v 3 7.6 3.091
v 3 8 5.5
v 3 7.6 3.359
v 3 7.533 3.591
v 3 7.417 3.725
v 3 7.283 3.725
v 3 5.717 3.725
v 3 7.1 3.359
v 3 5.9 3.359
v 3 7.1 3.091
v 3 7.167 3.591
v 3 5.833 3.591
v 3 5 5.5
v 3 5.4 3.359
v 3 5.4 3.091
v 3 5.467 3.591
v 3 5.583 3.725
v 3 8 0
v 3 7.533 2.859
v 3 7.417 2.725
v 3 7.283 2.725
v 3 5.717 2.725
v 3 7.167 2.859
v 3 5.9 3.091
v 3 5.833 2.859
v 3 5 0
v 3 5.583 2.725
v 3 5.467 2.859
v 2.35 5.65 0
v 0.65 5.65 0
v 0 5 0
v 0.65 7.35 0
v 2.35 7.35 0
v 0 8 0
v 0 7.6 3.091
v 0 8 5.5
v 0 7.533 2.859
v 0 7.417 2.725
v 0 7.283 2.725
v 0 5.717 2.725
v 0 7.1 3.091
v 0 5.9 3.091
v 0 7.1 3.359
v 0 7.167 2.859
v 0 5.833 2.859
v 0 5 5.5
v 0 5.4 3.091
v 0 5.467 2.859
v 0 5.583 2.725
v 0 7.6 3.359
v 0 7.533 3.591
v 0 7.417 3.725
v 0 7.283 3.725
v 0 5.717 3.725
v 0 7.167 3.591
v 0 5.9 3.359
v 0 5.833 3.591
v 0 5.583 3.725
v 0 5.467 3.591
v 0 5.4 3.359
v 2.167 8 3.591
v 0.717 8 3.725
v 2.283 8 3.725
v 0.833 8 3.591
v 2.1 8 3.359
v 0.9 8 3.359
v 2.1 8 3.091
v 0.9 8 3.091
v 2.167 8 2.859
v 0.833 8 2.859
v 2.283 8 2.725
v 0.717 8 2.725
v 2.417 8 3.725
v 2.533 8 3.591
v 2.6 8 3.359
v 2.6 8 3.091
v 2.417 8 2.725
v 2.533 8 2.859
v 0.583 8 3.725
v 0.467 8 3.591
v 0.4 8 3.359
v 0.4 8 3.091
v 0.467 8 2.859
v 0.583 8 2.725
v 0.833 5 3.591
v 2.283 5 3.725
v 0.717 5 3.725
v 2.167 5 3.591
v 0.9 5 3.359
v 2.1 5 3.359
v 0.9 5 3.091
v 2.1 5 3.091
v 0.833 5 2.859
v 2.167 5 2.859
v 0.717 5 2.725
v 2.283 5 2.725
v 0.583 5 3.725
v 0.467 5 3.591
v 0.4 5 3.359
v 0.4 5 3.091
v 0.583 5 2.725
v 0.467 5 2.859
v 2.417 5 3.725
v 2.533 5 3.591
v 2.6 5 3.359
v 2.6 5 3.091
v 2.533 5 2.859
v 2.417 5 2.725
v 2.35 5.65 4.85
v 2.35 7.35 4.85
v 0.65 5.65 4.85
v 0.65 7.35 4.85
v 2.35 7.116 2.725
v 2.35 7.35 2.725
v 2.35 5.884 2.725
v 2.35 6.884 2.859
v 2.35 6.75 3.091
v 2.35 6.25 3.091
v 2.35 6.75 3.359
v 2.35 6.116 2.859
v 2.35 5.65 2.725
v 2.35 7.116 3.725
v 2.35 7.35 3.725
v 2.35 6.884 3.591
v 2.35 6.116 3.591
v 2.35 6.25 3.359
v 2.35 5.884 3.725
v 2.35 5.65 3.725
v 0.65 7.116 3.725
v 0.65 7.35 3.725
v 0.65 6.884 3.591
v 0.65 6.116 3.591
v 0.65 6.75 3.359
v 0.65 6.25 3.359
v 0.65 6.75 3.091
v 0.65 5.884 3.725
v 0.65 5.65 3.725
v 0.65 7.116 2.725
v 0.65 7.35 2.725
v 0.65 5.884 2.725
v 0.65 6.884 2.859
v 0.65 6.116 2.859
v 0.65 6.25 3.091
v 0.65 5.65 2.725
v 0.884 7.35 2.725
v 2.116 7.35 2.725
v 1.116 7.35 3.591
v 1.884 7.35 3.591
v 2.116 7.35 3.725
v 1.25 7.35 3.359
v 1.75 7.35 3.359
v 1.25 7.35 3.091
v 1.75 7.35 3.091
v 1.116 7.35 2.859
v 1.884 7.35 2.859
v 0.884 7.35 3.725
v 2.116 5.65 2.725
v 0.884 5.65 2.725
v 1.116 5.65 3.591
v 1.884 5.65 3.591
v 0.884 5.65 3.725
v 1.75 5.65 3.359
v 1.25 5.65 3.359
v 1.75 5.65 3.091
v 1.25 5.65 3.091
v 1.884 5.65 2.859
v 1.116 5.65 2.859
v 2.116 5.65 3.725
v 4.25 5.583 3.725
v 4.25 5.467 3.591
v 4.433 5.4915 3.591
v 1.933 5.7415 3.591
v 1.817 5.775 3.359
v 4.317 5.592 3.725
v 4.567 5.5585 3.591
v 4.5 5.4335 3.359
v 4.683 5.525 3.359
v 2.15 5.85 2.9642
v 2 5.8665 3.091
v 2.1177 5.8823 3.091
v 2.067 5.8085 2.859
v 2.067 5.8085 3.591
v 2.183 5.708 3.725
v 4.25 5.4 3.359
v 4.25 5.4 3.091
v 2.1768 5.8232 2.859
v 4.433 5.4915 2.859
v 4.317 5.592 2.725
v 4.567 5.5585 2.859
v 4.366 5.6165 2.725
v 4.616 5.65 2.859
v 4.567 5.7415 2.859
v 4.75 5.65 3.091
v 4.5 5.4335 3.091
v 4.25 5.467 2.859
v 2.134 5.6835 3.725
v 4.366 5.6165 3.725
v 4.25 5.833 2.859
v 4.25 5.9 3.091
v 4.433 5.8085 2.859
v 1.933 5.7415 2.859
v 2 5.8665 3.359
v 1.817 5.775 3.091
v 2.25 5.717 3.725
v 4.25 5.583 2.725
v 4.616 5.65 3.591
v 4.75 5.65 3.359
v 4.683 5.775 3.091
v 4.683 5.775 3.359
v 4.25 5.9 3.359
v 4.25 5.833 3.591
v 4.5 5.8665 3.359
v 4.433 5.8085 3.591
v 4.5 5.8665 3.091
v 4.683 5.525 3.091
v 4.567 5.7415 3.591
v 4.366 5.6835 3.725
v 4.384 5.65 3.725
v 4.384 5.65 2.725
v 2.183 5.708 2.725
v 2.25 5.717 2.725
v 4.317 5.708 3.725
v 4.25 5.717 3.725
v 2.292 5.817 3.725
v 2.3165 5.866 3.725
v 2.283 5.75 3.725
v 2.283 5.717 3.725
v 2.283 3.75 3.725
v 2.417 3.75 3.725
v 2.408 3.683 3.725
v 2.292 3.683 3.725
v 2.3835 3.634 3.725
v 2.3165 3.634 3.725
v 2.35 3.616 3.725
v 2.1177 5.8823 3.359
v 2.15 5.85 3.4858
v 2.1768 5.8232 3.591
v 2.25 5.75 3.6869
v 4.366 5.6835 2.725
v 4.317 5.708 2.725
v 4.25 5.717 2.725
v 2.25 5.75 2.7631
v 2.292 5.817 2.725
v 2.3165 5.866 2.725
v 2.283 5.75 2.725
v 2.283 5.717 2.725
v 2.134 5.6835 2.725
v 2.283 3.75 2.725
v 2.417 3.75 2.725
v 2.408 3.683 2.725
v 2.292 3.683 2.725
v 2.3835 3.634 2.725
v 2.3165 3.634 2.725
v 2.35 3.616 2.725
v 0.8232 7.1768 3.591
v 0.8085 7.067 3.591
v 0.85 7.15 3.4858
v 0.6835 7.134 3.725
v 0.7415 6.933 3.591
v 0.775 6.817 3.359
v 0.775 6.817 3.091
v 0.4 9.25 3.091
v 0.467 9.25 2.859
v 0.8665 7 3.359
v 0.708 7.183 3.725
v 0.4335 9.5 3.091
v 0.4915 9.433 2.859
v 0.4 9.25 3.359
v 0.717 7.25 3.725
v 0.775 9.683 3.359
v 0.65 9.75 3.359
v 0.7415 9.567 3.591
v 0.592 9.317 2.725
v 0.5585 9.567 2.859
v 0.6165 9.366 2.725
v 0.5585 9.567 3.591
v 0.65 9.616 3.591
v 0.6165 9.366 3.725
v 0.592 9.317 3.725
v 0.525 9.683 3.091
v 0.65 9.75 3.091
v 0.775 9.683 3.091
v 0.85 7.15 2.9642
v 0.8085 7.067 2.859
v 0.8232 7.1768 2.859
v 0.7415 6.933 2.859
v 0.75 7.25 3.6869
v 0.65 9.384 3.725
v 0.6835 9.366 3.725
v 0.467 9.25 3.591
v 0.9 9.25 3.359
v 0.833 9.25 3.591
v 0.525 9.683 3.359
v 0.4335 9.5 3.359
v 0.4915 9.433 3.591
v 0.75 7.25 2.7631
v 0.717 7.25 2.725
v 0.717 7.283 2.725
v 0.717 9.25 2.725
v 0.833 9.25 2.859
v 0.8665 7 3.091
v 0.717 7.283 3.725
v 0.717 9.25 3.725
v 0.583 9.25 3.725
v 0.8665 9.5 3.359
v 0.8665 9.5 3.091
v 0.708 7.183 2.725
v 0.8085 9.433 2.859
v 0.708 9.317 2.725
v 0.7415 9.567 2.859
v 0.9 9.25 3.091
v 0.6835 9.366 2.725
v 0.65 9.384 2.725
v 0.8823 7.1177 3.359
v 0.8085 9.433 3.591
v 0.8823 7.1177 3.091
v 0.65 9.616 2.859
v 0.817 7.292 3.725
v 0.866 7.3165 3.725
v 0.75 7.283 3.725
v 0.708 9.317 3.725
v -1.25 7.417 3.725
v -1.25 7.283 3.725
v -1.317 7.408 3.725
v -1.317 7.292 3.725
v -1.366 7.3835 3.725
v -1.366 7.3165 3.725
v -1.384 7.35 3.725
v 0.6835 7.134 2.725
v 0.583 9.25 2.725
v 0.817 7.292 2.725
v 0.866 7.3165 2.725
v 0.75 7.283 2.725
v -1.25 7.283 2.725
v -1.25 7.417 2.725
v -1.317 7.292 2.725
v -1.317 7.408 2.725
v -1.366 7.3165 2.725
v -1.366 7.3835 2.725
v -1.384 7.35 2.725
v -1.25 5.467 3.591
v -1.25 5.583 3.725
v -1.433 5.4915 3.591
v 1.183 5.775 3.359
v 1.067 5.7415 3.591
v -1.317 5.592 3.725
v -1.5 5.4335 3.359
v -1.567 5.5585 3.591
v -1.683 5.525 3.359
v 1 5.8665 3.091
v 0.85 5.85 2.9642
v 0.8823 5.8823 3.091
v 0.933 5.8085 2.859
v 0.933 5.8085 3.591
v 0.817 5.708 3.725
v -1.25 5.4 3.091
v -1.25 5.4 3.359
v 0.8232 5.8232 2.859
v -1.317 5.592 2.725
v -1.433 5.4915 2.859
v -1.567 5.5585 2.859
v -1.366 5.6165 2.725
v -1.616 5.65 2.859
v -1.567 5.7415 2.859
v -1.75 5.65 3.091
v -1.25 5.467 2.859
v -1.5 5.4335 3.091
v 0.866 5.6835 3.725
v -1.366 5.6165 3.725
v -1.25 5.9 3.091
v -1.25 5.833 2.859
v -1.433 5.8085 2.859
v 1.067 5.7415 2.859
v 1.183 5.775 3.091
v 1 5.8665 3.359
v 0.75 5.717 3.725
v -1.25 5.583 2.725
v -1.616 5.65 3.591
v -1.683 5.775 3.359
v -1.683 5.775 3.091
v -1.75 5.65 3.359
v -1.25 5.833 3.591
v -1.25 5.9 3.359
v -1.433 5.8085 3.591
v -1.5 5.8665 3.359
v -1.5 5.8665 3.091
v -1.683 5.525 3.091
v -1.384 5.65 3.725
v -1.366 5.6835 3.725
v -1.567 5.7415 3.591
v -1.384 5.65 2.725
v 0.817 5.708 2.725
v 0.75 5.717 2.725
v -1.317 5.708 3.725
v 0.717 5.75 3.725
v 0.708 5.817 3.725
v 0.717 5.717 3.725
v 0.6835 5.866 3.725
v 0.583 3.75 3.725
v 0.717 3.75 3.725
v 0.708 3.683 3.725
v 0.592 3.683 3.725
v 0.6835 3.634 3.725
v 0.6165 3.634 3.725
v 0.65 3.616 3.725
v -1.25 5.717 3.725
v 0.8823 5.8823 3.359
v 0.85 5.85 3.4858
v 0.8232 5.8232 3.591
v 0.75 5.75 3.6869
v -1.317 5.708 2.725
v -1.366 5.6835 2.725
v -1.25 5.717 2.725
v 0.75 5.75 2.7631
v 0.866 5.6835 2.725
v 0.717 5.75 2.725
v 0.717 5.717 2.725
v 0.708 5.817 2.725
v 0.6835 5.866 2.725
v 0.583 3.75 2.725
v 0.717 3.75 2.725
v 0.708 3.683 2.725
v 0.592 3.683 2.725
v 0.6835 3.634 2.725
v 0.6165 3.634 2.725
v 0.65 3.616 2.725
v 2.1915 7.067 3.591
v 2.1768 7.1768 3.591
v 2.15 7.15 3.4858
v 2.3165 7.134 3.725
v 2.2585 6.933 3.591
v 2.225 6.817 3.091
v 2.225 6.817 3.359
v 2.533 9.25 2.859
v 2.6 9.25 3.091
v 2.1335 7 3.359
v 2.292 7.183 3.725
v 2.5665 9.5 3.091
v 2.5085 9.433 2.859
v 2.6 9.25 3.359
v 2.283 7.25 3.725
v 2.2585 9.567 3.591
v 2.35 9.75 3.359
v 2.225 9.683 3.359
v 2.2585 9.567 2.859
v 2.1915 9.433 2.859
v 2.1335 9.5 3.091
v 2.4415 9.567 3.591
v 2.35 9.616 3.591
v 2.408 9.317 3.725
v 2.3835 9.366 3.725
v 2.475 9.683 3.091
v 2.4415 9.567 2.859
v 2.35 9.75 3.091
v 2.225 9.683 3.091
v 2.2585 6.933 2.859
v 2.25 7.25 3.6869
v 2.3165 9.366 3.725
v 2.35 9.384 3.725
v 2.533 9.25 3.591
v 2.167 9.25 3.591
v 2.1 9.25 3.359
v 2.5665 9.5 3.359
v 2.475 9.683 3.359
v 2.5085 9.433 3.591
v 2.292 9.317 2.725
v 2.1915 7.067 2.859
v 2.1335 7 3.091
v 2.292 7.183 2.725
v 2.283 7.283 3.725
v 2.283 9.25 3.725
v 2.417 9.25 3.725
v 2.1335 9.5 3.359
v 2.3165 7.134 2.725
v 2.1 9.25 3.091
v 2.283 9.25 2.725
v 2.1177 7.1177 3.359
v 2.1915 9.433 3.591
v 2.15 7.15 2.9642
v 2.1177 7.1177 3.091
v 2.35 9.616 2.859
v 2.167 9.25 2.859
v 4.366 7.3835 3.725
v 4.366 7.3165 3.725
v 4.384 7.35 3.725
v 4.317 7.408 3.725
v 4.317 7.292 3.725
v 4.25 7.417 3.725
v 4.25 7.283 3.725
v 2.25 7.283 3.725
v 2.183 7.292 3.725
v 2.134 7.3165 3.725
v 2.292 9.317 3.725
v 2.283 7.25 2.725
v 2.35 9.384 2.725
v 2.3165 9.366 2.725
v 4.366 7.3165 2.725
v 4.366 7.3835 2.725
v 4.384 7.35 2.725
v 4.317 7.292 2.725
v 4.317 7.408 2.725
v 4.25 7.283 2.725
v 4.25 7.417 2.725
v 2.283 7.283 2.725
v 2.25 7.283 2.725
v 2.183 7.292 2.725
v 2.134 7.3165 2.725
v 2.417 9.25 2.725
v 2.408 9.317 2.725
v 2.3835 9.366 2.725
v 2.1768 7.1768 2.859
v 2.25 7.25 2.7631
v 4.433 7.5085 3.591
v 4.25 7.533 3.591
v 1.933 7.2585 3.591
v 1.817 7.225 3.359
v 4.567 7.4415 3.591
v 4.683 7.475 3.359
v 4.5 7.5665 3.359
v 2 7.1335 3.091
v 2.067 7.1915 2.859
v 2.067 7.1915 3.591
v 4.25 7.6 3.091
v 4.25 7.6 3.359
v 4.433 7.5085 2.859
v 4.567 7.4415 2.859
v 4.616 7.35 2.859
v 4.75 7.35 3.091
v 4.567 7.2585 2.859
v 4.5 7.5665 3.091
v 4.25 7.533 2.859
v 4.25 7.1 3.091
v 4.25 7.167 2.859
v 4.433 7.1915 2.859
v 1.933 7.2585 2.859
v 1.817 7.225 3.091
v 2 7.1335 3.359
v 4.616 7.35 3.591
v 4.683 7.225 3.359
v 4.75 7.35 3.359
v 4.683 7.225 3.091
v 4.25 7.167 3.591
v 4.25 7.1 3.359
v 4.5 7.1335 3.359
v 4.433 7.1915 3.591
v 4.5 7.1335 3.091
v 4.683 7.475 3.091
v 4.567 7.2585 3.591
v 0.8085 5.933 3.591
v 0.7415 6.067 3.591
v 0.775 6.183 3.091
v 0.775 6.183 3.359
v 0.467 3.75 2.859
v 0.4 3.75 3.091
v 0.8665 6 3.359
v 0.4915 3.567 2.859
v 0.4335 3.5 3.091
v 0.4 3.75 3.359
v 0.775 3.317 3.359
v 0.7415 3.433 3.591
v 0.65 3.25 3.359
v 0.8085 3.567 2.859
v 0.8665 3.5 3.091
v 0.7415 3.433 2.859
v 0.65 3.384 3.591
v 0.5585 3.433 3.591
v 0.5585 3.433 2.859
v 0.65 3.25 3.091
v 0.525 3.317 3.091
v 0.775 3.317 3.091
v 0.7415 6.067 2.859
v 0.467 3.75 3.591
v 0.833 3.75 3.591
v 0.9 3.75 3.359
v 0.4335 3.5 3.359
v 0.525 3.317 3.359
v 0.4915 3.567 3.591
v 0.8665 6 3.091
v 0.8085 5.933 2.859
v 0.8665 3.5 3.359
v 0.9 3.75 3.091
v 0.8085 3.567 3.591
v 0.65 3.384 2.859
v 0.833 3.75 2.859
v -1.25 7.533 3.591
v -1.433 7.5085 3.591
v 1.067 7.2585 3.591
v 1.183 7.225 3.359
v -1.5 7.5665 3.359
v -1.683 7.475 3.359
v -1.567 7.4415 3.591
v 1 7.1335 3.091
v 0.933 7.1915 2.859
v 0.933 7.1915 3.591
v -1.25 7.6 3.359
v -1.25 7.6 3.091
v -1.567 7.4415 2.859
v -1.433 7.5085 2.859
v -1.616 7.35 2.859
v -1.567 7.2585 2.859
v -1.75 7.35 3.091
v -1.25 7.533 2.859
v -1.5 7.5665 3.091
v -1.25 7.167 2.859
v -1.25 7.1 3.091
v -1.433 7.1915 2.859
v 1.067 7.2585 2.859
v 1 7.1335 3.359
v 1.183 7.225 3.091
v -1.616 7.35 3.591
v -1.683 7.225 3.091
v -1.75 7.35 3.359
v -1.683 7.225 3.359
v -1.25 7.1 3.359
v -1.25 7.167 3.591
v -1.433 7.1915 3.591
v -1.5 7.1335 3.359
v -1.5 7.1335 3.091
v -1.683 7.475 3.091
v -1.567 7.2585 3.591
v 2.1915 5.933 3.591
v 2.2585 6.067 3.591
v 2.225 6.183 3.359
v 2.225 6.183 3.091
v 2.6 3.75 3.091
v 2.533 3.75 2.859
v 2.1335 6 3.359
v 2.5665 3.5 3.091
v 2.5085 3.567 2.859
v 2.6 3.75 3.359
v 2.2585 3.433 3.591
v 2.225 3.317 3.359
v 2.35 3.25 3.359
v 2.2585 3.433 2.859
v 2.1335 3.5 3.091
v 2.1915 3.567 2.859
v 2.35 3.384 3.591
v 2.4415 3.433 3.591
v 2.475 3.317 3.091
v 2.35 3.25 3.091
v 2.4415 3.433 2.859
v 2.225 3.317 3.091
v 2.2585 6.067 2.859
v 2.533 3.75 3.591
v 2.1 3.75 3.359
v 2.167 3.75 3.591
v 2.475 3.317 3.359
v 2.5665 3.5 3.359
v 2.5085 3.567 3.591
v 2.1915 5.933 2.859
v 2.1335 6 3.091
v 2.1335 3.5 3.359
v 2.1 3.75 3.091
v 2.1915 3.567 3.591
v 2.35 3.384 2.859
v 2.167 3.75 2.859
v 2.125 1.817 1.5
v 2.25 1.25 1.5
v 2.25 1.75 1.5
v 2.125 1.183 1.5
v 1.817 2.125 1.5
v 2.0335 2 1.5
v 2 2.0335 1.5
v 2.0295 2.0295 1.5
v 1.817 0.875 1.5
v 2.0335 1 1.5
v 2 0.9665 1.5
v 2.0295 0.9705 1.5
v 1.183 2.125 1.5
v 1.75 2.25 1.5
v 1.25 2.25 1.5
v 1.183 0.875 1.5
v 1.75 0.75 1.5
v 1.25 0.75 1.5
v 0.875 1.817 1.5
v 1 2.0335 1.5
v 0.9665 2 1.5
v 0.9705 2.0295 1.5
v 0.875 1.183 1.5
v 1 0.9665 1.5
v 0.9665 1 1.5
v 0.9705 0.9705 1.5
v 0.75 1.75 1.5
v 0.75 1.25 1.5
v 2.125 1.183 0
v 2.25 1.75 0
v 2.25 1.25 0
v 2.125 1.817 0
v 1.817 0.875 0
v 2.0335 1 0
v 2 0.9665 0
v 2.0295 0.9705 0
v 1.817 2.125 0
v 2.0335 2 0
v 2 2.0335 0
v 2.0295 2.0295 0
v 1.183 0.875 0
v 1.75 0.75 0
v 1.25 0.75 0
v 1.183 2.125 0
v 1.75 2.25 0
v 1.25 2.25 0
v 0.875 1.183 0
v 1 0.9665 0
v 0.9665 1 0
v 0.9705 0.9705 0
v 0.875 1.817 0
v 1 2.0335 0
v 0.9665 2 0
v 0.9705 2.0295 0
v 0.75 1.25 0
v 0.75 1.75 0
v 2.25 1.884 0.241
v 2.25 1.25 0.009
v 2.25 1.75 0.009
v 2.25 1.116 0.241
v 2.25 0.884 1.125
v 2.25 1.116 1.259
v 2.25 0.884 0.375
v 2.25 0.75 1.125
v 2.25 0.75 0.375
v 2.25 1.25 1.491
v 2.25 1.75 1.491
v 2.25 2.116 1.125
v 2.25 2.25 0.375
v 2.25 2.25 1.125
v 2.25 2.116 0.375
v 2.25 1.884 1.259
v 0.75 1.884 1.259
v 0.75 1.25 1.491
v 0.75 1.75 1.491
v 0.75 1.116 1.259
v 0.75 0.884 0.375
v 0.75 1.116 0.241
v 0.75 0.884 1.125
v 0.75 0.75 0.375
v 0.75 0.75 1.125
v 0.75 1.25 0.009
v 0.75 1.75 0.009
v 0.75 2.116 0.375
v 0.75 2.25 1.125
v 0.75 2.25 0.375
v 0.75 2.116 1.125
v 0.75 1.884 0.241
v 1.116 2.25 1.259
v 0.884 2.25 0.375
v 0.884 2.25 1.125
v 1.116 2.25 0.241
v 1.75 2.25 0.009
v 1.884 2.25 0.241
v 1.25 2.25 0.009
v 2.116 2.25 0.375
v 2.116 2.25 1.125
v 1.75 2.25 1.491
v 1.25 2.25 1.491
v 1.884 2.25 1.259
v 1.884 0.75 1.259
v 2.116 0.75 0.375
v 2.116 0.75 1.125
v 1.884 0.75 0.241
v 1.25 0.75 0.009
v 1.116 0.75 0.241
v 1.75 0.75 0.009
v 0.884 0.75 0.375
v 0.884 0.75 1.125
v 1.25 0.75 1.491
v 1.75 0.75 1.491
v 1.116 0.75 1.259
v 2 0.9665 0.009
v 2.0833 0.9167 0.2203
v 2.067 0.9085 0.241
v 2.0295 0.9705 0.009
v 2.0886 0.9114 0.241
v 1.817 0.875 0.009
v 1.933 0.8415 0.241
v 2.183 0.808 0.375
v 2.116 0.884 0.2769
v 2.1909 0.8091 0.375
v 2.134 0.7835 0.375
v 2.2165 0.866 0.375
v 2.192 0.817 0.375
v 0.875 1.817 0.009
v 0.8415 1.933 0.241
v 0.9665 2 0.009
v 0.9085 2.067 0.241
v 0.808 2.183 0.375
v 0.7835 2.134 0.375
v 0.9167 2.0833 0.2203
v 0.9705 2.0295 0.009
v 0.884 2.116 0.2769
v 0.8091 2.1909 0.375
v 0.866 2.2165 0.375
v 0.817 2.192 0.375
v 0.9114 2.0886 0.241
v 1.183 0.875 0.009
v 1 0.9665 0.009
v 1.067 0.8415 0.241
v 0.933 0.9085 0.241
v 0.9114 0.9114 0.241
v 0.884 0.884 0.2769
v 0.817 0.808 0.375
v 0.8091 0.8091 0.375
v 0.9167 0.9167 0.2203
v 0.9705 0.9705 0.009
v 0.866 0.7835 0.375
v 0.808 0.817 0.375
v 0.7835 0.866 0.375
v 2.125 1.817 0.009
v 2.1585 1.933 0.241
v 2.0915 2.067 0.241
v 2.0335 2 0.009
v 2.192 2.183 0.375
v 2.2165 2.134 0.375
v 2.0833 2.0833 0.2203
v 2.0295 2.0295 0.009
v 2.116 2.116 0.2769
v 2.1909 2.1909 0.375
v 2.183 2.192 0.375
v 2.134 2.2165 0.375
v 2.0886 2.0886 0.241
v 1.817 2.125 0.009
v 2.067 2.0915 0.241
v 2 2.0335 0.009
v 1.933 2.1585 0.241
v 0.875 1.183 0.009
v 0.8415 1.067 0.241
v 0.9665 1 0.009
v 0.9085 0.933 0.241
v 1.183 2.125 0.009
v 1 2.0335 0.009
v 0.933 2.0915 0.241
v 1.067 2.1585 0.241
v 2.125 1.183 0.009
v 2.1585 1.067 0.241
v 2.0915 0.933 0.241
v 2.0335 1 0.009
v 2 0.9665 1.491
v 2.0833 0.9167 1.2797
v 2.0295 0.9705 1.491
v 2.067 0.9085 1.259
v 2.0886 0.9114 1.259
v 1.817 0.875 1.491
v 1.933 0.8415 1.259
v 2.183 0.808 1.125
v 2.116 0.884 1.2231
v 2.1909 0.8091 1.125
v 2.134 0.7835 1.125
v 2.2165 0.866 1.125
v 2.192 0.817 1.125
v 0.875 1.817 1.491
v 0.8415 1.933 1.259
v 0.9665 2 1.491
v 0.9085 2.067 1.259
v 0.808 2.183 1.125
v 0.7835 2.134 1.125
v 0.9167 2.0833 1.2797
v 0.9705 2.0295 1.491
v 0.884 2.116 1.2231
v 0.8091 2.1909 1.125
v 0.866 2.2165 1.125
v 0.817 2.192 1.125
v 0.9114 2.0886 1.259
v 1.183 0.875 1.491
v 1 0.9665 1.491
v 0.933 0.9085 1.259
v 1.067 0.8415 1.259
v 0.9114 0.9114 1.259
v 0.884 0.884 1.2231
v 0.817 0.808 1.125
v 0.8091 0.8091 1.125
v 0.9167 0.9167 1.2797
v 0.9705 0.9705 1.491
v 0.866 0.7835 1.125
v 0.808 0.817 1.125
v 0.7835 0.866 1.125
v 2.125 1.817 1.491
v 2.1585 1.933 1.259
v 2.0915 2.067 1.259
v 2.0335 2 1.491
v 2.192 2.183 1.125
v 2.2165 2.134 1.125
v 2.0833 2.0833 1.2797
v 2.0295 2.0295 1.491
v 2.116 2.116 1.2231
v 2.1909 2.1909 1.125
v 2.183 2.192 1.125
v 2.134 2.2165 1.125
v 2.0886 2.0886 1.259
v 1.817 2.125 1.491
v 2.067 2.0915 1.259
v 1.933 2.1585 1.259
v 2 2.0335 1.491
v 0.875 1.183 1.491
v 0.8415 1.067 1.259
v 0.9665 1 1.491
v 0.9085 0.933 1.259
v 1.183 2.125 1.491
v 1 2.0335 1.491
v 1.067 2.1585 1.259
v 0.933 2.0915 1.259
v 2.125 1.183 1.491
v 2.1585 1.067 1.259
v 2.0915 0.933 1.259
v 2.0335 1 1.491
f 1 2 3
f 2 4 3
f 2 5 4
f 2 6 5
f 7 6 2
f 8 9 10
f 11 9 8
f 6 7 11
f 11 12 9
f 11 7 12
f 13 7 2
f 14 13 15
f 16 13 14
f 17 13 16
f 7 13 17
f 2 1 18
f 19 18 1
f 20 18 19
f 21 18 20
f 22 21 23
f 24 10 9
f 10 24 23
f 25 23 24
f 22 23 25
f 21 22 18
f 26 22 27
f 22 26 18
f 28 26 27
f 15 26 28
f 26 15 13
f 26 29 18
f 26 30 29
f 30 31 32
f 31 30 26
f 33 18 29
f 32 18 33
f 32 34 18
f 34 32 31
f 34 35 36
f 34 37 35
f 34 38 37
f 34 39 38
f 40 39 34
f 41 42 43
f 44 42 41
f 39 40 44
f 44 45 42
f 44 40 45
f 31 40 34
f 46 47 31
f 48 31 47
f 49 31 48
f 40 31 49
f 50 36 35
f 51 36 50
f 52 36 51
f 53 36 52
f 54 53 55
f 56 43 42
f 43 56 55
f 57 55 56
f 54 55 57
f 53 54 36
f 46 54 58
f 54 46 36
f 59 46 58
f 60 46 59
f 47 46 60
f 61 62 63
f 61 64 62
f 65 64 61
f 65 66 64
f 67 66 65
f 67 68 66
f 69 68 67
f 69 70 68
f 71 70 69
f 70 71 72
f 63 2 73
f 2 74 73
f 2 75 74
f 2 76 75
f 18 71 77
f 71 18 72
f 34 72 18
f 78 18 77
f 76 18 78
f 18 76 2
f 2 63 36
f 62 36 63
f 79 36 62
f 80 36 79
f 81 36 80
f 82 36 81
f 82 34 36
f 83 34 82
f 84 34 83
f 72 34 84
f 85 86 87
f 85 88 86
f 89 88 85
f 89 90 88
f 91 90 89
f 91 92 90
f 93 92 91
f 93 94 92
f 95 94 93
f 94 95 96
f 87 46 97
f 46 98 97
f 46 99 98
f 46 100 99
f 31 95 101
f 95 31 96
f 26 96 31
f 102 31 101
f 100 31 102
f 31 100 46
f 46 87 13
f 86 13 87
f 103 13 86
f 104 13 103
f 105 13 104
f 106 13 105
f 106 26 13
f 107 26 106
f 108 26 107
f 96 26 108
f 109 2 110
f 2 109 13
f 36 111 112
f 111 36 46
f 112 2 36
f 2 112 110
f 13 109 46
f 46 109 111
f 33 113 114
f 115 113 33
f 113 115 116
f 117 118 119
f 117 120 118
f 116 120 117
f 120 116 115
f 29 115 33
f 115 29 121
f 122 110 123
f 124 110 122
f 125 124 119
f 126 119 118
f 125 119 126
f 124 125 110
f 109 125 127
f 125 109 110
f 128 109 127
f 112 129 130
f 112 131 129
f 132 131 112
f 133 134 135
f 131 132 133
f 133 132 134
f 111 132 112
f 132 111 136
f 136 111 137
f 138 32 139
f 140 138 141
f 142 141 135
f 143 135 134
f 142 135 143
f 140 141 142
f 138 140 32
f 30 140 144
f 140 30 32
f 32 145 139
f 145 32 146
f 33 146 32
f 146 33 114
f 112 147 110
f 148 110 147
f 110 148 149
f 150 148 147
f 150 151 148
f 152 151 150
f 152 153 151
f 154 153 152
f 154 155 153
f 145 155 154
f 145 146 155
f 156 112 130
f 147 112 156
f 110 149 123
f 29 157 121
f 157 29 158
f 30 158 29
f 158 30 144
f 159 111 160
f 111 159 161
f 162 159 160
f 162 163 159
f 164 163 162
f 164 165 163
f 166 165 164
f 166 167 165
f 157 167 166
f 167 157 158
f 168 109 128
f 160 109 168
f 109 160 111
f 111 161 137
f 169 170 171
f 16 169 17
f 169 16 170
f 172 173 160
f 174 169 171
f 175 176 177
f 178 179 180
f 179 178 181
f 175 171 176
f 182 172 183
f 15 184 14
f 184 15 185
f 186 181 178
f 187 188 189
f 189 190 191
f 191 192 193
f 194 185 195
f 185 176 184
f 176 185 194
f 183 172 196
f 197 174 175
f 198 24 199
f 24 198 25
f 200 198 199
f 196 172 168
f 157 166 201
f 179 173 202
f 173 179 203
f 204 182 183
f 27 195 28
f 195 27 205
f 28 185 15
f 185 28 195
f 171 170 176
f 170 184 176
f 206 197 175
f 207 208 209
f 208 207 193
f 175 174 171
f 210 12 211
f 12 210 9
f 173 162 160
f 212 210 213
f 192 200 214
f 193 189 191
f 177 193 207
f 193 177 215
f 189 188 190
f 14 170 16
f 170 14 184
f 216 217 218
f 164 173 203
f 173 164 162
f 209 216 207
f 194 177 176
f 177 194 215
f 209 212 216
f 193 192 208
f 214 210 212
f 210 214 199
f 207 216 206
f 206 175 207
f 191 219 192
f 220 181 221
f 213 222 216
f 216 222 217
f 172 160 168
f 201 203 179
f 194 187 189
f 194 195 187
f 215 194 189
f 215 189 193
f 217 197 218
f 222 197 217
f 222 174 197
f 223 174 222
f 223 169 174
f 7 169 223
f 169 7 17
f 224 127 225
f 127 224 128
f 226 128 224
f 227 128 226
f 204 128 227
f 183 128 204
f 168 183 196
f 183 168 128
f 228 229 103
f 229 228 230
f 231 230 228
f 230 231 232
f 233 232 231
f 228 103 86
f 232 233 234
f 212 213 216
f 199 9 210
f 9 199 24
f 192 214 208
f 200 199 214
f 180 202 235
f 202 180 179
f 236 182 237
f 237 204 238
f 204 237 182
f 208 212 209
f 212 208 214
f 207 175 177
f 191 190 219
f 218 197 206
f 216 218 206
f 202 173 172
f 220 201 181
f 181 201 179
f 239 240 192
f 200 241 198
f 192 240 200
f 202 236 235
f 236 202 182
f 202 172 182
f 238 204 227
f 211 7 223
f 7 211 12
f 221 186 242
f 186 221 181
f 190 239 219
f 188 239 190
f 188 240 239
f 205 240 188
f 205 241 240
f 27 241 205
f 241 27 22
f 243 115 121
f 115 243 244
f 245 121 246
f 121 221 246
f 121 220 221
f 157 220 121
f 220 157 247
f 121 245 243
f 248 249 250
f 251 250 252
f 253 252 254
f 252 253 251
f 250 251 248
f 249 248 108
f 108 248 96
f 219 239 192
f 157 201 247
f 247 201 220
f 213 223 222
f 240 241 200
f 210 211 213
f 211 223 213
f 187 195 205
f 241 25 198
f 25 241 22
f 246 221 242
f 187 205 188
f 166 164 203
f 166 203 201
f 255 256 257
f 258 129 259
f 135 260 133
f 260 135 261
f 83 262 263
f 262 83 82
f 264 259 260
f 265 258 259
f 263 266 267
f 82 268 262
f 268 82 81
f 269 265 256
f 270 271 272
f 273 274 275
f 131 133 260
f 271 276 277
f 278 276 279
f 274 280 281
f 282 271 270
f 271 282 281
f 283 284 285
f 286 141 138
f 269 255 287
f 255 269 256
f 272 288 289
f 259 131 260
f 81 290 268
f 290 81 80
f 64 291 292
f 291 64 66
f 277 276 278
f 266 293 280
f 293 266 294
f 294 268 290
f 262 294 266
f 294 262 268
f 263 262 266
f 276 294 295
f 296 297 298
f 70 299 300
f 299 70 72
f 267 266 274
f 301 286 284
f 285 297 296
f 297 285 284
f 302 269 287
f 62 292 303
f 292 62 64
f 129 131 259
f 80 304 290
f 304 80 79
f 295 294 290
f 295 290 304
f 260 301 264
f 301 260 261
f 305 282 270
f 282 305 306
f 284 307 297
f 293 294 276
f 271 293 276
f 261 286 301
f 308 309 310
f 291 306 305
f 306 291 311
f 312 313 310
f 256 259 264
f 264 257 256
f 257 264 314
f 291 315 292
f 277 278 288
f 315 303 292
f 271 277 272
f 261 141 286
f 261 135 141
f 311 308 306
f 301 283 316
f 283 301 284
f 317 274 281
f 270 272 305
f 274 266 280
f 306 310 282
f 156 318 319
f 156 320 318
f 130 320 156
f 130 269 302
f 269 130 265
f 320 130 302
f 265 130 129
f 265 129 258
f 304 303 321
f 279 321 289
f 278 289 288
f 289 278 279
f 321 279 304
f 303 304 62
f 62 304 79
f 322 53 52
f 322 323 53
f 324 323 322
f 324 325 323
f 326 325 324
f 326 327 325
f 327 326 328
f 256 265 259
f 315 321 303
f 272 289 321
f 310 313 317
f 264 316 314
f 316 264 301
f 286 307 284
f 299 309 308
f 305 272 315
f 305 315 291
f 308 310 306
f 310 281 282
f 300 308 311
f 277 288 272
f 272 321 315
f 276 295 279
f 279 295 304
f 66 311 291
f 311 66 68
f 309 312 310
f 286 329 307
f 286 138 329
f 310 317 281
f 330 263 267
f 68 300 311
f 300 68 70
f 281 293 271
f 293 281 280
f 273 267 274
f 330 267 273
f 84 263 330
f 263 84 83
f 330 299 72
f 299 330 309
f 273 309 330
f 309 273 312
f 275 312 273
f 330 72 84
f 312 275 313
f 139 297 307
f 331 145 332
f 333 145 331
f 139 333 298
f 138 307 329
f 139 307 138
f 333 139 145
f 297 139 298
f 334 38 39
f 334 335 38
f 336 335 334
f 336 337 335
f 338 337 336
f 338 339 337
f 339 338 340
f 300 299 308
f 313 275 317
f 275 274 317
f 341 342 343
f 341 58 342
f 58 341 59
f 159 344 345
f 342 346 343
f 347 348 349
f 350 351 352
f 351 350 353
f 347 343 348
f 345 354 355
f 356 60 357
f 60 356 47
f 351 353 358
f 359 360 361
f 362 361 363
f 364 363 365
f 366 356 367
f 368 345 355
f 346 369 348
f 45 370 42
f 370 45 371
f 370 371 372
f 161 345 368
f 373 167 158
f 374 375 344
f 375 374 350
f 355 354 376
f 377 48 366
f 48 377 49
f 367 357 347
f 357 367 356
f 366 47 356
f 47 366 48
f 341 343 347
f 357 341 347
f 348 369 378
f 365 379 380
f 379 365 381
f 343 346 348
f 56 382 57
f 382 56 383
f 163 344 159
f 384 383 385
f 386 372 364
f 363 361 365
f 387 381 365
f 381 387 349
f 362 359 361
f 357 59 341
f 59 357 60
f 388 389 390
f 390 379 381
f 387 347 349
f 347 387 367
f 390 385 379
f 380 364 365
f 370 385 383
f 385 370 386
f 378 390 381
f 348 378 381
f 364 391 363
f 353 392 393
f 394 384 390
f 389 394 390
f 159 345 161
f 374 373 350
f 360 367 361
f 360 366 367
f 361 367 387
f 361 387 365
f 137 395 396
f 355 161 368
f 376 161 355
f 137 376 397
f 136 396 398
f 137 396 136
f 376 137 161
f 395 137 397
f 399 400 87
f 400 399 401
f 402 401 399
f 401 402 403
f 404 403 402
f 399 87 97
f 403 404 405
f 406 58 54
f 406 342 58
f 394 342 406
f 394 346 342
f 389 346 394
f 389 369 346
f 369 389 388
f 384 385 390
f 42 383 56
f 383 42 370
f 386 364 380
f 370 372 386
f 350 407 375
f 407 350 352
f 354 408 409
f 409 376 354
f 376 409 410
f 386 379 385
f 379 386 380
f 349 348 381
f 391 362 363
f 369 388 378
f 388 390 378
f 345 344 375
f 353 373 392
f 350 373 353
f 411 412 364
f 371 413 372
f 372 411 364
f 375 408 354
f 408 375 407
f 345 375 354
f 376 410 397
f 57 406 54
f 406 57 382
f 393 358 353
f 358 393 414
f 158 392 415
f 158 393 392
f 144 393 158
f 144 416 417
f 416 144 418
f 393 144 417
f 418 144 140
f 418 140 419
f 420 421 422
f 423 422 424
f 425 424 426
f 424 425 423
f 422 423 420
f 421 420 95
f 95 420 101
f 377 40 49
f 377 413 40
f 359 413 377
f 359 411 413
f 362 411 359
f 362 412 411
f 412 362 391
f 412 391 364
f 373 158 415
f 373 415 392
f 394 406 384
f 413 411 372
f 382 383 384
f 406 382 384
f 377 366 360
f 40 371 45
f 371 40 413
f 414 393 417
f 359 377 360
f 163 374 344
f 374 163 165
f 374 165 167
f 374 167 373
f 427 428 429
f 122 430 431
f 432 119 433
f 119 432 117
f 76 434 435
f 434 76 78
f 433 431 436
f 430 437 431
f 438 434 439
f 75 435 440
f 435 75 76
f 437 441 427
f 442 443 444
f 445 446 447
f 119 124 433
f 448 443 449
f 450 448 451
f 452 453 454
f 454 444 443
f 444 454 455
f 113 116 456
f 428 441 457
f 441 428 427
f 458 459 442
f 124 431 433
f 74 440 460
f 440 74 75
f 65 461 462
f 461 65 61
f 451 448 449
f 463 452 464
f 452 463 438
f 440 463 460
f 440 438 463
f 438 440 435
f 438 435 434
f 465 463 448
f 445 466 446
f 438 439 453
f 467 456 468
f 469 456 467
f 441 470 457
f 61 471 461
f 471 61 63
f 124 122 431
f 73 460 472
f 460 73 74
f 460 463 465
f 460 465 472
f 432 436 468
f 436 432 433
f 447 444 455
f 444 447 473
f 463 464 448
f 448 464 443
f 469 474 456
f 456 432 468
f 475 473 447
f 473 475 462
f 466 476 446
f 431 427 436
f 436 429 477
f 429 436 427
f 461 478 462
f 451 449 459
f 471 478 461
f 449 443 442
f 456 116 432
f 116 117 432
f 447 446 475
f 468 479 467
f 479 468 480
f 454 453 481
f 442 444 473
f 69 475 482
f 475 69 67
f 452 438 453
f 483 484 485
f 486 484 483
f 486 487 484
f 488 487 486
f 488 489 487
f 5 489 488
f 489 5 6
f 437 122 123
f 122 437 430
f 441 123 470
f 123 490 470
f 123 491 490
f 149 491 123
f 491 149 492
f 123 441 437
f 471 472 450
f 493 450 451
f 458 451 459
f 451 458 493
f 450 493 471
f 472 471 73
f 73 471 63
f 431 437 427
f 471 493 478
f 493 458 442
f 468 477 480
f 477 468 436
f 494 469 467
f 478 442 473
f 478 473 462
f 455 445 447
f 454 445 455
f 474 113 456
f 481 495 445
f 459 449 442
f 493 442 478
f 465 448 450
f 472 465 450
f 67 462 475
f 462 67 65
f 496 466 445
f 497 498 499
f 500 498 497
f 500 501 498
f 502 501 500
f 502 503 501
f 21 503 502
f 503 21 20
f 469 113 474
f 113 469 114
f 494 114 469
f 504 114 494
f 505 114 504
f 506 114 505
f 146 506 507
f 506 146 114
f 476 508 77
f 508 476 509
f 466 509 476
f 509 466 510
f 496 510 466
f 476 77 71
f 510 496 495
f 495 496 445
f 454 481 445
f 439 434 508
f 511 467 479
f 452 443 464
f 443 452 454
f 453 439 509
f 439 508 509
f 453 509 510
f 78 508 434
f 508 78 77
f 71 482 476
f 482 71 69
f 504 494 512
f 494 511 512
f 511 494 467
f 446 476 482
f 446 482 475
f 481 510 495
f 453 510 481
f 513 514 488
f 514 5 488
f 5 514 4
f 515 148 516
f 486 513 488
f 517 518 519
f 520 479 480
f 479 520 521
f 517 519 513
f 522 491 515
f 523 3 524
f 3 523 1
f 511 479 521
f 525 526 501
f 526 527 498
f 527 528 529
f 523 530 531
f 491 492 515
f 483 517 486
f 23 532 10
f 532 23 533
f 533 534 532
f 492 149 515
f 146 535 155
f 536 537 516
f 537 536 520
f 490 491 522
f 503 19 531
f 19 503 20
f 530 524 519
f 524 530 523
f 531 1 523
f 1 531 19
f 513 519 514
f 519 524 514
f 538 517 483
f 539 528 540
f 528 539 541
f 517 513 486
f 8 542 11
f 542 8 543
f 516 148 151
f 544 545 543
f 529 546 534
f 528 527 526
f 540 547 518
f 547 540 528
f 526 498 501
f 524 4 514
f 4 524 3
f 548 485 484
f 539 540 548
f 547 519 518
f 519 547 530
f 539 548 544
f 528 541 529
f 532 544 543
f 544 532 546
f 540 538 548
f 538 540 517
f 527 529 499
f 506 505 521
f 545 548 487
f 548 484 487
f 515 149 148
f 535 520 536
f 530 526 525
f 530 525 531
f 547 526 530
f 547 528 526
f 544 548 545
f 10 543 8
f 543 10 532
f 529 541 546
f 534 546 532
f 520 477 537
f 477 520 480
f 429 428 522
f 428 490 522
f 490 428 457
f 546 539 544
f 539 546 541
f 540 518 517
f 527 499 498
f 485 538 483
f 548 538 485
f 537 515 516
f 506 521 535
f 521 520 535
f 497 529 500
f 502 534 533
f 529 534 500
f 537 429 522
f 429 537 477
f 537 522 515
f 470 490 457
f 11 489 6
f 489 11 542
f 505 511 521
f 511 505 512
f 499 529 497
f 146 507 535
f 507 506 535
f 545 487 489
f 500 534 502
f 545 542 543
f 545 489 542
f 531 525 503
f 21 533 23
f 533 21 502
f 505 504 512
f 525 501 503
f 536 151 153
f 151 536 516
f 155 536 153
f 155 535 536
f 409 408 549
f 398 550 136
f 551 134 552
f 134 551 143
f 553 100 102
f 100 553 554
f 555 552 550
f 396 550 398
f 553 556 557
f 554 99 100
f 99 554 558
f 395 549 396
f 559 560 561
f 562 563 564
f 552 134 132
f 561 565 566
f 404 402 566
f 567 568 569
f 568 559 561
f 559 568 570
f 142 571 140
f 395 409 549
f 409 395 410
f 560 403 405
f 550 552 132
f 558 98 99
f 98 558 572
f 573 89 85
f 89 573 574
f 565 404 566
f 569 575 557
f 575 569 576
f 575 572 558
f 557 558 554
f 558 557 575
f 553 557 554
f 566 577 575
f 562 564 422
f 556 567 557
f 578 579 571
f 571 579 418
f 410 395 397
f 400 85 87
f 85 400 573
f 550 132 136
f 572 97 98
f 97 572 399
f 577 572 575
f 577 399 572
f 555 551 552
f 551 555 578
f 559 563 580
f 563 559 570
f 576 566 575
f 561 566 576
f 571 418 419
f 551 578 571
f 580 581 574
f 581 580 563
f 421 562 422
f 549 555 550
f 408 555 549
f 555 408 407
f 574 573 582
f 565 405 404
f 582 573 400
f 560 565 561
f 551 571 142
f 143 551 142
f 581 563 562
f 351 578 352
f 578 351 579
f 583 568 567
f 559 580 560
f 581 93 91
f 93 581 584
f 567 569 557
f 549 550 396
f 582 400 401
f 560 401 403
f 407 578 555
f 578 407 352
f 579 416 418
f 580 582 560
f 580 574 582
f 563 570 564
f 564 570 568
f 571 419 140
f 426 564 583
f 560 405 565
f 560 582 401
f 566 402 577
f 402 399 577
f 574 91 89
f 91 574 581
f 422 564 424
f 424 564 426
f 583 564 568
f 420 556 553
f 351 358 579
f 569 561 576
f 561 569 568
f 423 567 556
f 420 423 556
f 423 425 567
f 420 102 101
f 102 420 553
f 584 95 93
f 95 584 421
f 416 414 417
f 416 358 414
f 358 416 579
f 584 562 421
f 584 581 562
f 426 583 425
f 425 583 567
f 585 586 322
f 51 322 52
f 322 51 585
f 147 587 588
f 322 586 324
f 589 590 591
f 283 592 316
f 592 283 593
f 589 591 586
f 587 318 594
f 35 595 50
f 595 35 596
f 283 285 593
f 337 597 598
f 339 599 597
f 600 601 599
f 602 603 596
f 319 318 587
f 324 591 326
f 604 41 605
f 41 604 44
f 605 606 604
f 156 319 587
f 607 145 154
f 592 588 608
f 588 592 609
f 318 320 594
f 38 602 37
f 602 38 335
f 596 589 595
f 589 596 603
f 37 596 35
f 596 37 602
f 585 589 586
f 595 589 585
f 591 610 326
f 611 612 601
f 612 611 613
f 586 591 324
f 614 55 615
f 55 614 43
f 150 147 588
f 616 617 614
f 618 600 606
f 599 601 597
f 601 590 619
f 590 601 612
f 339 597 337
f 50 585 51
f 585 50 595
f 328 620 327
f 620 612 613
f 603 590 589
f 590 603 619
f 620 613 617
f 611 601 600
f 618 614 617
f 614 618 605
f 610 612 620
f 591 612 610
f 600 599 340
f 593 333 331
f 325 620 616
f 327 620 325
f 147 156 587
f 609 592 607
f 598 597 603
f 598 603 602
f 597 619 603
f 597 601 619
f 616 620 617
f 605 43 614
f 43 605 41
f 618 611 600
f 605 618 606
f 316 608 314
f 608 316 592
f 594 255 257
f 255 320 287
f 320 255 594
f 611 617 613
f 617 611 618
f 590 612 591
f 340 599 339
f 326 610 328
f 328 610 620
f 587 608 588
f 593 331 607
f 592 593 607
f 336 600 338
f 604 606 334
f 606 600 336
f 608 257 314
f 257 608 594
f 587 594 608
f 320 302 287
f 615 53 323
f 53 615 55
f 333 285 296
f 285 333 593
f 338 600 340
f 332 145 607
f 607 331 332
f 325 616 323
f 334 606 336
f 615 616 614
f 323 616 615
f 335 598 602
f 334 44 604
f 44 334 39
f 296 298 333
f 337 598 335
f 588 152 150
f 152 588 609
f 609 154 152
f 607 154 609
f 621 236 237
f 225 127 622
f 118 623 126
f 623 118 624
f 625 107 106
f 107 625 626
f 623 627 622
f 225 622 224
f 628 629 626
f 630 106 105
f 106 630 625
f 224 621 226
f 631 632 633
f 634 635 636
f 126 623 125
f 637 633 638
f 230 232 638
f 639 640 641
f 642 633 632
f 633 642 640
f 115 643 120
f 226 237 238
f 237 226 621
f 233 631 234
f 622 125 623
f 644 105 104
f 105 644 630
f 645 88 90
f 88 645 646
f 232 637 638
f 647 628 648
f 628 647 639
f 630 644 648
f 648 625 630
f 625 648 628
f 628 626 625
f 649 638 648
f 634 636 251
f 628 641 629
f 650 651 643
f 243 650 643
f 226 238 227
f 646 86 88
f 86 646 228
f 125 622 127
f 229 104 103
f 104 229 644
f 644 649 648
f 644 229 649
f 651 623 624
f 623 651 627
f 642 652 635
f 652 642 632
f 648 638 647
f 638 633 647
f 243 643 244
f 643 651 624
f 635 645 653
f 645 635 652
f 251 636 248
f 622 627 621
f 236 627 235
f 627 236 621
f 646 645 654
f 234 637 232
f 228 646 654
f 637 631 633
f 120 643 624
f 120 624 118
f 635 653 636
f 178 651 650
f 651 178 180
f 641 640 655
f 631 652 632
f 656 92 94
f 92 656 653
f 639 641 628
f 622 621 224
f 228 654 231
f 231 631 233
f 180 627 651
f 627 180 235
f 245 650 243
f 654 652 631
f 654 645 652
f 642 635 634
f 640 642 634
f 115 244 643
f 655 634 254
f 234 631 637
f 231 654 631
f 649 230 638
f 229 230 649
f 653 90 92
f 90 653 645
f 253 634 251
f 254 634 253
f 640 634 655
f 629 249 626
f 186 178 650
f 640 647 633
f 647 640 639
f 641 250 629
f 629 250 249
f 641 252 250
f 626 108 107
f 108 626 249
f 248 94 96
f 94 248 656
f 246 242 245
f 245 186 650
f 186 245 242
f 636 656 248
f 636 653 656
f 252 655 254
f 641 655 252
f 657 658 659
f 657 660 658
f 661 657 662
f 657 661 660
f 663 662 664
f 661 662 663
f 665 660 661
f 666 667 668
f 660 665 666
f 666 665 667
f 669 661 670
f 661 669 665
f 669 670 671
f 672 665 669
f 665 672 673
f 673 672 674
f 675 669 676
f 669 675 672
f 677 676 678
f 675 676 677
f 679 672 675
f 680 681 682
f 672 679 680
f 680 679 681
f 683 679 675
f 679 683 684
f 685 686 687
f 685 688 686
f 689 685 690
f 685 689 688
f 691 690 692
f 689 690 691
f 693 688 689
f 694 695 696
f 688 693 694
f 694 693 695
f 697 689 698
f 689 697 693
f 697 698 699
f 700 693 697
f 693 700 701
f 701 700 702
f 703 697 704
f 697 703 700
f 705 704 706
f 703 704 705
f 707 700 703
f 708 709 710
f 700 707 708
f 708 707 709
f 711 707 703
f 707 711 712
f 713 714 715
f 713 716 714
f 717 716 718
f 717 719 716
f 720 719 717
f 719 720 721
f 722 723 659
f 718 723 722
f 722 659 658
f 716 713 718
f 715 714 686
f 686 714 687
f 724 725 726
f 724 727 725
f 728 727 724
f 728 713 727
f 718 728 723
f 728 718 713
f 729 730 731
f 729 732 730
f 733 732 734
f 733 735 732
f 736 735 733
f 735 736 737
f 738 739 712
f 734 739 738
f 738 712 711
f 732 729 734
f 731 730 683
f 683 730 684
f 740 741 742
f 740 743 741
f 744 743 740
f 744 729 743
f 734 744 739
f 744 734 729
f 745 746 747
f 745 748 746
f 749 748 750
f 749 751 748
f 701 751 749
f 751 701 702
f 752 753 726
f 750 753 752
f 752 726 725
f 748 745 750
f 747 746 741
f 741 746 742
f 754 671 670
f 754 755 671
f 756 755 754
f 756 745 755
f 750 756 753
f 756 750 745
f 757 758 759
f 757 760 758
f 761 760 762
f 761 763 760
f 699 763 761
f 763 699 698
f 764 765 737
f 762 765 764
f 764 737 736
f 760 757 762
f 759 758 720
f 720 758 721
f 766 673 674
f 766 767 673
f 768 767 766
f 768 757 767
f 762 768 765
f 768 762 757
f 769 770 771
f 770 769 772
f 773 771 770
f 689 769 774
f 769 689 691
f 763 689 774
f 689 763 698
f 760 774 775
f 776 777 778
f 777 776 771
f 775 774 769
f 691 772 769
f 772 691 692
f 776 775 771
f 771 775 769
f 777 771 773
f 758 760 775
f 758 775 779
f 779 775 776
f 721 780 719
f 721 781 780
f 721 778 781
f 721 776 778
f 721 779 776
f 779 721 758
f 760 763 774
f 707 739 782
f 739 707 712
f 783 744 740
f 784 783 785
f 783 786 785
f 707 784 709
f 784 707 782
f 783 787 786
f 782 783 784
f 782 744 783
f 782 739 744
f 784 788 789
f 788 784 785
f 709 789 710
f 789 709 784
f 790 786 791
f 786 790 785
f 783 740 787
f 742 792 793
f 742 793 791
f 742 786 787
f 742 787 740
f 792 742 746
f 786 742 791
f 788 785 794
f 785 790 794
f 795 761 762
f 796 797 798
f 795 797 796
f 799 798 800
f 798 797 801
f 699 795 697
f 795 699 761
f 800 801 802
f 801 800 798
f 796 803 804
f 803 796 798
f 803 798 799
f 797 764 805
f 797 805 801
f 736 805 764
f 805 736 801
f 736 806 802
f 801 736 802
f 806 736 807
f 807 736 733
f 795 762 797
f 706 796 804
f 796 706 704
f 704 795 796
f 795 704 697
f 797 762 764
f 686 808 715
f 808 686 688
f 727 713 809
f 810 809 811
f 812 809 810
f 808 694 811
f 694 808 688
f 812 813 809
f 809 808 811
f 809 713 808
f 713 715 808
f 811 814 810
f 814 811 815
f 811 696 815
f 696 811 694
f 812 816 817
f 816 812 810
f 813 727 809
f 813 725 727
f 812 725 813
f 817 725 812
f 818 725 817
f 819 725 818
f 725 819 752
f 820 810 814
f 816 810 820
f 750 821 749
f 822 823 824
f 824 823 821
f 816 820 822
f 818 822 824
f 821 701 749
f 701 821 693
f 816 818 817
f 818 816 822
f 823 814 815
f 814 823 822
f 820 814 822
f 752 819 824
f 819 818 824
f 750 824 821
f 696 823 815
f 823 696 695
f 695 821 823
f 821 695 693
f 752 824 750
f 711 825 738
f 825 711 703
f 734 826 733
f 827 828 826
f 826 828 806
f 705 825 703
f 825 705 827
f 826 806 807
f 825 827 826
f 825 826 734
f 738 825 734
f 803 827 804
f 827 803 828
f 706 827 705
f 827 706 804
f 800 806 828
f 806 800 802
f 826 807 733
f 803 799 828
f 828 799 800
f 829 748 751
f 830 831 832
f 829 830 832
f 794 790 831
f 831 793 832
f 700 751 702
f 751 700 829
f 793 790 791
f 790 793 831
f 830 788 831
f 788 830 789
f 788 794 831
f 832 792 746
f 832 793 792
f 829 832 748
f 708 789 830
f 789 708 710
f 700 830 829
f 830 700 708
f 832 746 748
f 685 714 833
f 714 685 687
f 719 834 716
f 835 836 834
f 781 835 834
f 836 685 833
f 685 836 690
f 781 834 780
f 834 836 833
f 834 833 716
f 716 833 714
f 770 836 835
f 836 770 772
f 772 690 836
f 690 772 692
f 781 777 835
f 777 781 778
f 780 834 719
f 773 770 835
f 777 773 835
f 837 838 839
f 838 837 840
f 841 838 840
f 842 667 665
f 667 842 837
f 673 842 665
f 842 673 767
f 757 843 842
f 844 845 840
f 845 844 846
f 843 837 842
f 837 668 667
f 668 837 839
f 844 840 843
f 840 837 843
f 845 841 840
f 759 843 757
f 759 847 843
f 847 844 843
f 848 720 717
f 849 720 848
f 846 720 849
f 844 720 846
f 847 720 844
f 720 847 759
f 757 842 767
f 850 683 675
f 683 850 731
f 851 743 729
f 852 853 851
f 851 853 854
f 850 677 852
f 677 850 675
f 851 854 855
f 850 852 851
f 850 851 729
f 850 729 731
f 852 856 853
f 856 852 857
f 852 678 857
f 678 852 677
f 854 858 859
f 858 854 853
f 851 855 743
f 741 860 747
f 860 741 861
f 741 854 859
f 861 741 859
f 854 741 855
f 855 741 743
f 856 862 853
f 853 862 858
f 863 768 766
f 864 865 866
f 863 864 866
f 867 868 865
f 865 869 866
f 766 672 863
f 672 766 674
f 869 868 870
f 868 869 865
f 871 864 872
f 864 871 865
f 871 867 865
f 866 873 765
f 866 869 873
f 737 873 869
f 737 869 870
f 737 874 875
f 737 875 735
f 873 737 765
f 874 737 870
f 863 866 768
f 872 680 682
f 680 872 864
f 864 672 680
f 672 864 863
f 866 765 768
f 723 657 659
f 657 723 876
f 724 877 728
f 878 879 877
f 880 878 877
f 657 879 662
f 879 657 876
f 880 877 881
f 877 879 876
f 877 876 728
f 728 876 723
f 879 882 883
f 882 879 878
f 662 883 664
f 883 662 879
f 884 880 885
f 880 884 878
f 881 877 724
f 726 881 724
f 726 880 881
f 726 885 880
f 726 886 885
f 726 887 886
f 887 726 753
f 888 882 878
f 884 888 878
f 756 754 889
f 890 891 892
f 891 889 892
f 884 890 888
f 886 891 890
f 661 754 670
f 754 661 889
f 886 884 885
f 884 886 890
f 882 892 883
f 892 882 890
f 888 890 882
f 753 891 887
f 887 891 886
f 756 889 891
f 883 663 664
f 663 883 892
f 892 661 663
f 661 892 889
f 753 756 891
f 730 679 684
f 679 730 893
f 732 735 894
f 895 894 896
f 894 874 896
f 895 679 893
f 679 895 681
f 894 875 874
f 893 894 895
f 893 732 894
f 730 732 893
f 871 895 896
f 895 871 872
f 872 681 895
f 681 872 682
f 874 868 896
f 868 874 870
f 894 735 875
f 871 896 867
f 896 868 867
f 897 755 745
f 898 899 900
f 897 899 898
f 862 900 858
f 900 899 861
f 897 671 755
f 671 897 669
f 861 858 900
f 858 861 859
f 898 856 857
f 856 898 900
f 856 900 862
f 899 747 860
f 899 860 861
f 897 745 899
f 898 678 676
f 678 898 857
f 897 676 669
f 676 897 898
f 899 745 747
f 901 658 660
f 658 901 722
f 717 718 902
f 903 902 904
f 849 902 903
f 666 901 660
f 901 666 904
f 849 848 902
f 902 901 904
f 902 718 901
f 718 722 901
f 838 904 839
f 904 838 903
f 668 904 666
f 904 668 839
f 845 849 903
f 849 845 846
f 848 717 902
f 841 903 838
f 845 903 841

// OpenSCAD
// BGSD
include <../lib/boardgame_insert_toolkit_lib.4.scad>;
data = [
    // Source STL: Tokens A.stl
    // STL bbox min [31, -36, 0] max [83, 119, 41] size [52, 155, 41]
    // Detected compartments: 3; wall thickness: 1.5mm
    [ OBJECT_BOX,
        [ NAME, "Tokens A" ],
        [ BOX_SIZE_XYZ, [52, 155, 41] ],
        [ BOX_WALL_THICKNESS, 1.5 ],
        [ BOX_NO_LID_B, true ],
        [ BOX_FEATURE,
            [ NAME, "Tokens A cavity 1" ],
            [ FTR_COMPARTMENT_SIZE_XYZ, [49, 47, 39.5] ],
            [ FTR_NUM_COMPARTMENTS_XY, [1, 1] ],
            [ FTR_SHAPE, SQUARE ],
            [ POSITION_XY, [0, 0] ],
        ],
        [ BOX_FEATURE,
            [ NAME, "Tokens A cavity 2" ],
            [ FTR_COMPARTMENT_SIZE_XYZ, [49, 44.5, 39.5] ],
            [ FTR_NUM_COMPARTMENTS_XY, [1, 1] ],
            [ FTR_SHAPE, SQUARE ],
            [ POSITION_XY, [0, 48.5] ],
        ],
        [ BOX_FEATURE,
            [ NAME, "Tokens A cavity 3" ],
            [ FTR_COMPARTMENT_SIZE_XYZ, [49, 57.5, 39.5] ],
            [ FTR_NUM_COMPARTMENTS_XY, [1, 1] ],
            [ FTR_SHAPE, SQUARE ],
            [ POSITION_XY, [0, 94.5] ],
        ],
    ],
];
Make(data);
